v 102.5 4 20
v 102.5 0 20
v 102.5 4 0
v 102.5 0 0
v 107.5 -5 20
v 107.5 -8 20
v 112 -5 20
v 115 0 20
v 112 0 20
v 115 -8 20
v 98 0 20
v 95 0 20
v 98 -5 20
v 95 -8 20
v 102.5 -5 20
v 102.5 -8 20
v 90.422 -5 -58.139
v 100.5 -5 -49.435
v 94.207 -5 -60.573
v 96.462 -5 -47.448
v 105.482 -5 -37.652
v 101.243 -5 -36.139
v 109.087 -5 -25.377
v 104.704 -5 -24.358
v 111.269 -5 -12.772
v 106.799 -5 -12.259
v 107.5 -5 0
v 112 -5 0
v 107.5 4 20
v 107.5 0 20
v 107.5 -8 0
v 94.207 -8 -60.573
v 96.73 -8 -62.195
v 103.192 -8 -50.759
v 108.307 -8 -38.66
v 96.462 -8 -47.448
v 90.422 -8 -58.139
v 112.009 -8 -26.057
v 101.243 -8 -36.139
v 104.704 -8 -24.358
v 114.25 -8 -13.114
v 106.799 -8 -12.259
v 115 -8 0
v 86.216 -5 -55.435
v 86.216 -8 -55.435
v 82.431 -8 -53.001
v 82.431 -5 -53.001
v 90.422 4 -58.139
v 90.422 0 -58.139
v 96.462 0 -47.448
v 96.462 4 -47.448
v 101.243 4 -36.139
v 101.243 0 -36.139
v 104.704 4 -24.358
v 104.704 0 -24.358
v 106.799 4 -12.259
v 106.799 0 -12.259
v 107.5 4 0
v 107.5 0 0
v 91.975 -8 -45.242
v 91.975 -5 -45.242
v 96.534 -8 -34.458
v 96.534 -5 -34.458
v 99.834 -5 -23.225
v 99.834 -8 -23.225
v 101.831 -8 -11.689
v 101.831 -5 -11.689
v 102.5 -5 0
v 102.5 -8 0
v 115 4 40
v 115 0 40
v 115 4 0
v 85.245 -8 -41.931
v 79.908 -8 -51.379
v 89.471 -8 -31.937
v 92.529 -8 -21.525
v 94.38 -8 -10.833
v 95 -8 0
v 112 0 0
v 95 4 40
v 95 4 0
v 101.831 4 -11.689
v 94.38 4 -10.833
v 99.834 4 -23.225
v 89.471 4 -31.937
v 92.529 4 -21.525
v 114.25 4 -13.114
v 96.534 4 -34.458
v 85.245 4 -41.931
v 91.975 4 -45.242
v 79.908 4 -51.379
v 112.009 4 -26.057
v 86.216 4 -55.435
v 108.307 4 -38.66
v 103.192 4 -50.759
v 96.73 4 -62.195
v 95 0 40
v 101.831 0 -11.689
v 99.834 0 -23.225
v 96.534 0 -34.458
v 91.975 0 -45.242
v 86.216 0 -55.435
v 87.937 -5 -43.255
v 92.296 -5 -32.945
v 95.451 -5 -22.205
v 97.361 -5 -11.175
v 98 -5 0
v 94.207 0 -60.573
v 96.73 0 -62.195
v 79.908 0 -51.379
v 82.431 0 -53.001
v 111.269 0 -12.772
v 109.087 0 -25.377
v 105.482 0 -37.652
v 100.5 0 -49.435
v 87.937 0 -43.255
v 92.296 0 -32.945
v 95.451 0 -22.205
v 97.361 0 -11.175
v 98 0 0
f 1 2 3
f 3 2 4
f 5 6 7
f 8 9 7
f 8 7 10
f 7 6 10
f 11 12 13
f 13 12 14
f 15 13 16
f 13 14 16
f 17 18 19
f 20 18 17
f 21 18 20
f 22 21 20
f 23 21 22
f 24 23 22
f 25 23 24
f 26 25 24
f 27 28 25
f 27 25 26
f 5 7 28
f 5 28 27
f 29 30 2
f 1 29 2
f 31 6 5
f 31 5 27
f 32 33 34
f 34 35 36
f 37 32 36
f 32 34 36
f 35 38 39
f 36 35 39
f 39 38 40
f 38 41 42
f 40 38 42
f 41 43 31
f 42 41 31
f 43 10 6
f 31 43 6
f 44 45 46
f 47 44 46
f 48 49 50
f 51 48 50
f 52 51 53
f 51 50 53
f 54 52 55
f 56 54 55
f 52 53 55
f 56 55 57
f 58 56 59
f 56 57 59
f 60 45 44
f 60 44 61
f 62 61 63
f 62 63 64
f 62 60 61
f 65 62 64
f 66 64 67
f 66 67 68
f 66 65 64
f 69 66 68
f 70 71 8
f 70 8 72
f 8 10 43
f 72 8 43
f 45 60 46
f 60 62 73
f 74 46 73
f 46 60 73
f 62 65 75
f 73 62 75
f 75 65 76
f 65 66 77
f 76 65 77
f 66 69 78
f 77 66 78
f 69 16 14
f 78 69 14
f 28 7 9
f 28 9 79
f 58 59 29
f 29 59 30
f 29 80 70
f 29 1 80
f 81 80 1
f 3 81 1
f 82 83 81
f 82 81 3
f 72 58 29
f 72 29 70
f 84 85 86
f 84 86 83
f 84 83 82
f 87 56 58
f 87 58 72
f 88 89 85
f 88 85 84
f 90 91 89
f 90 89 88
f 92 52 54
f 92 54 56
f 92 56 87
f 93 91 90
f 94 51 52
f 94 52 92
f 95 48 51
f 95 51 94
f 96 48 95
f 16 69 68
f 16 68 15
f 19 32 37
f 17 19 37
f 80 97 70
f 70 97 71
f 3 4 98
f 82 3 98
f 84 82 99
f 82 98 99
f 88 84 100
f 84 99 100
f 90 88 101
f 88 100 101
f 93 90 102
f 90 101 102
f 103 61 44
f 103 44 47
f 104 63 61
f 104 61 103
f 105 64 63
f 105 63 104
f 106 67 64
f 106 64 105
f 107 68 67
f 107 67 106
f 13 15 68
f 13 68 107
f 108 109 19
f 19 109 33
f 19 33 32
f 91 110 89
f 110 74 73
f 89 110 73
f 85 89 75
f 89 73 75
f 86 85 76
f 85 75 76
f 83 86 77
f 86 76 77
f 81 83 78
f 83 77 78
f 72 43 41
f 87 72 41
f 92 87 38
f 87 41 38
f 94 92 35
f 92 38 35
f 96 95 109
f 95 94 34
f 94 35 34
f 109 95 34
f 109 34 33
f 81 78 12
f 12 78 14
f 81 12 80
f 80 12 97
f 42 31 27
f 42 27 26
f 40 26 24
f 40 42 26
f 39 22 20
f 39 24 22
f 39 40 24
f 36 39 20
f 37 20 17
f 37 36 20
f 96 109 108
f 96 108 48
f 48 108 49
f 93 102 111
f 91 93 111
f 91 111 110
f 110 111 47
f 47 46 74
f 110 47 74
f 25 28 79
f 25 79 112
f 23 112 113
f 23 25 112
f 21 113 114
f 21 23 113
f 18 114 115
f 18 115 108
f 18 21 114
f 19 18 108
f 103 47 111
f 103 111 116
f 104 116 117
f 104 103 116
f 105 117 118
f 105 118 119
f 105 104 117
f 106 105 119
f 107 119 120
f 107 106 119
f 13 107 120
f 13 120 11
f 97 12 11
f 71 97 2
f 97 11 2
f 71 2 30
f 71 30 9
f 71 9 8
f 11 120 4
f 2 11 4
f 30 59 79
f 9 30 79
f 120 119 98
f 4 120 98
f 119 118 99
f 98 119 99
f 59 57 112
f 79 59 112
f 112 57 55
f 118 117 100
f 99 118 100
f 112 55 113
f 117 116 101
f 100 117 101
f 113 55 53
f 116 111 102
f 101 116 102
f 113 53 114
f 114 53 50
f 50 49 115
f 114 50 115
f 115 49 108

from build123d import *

# Parameters (mm, degrees)
BOSS_EXTRUDE1_DEPTH = 4
BOSS_EXTRUDE2_START = 5
BOSS_EXTRUDE2_DEPTH = 5
BOSS_EXTRUDE3_START = 3
BOSS_EXTRUDE3_DEPTH = 3
CUT_EXTRUDE1_START  = -43
CUT_EXTRUDE1_DEPTH  = 43


with BuildPart() as part:
    # Sketch1 → Boss-Extrude1 (new body)
    with BuildSketch(Plane(origin=(0, 0, 0), x_dir=(1, 0, 0), z_dir=(0, 1, 0))):
        with BuildLine():
            Line((86.216175346, 55.434836598), (79.907674711, 51.378629042))
            ThreePointArc((79.907674711, 51.378629042), (91.148859284, 26.774716641), (95, 0))
            Line((95, 0), (102.5, 0))
            ThreePointArc((102.5, 0), (98.344821859, 28.88851006), (86.216175346, 55.434836598))
        make_face()
        with BuildLine():
            Line((96.730343071, 62.195182525), (90.421842436, 58.138974969))
            ThreePointArc((90.421842436, 58.138974969), (103.142130242, 30.297705673), (107.5, 0))
            Line((107.5, 0), (115, 0))
            ThreePointArc((115, 0), (110.338092817, 32.411499092), (96.730343071, 62.195182525))
        make_face()
        Polygon((102.5, 0), (95, 0), (95, -40), (115, -40), (115, 0), (107.5, 0), (107.5, -20), (102.5, -20), align=None)
    extrude(amount=BOSS_EXTRUDE1_DEPTH)

    # Sketch2 → Boss-Extrude2 (add)
    with BuildSketch(Plane.XZ.offset(BOSS_EXTRUDE2_START)):
        with BuildLine():
            Line((112, 20), (112, 0))
            ThreePointArc((112, 0), (107.459707787, -31.565981725), (94.206942817, -60.572699503))
            Line((94.206942817, -60.572699503), (96.730343071, -62.195182525))
            ThreePointArc((96.730343071, -62.195182525), (110.338092817, -32.411499092), (115, 0))
            Line((115, 0), (115, 20))
            Line((115, 20), (112, 20))
        make_face()
        with BuildLine():
            ThreePointArc((82.431074965, -53.001112065), (94.027244314, -27.620234009), (98, 0))
            Line((98, 0), (98, 20))
            Line((98, 20), (95, 20))
            Line((95, 20), (95, 0))
            ThreePointArc((95, 0), (91.148859284, -26.774716641), (79.907674711, -51.378629042))
            Line((79.907674711, -51.378629042), (82.431074965, -53.001112065))
        make_face()
    extrude(amount=-BOSS_EXTRUDE2_DEPTH)

    # Sketch3 → Boss-Extrude3 (add)
    with BuildSketch(Plane.XZ.offset(5).offset(BOSS_EXTRUDE3_START)):
        with BuildLine():
            Line((98, 20), (112, 20))
            Line((112, 20), (115, 20))
            Line((115, 20), (115, 0))
            ThreePointArc((115, 0), (110.338092817, -32.411499092), (96.730343071, -62.195182525))
            Line((96.730343071, -62.195182525), (94.206942817, -60.572699503))
            Line((94.206942817, -60.572699503), (82.431074965, -53.001112065))
            Line((82.431074965, -53.001112065), (79.907674711, -51.378629042))
            ThreePointArc((79.907674711, -51.378629042), (91.148859284, -26.774716641), (95, 0))
            Line((95, 0), (95, 20))
            Line((95, 20), (98, 20))
        make_face()
    extrude(amount=-BOSS_EXTRUDE3_DEPTH)

    # Sketch4 → Cut-Extrude1 (cut)
    with BuildSketch(Plane(origin=(0, 4, 0), x_dir=(1, 0, 0), z_dir=(0, 1, 0)).offset(CUT_EXTRUDE1_START)):
        with BuildLine():
            Line((90.421842436, 58.138974969), (86.216175346, 55.434836598))
            ThreePointArc((86.216175346, 55.434836598), (98.344821859, 28.88851006), (102.5, 0))
            Line((102.5, 0), (102.5, -20))
            Line((102.5, -20), (107.5, -20))
            Line((107.5, -20), (107.5, 0))
            ThreePointArc((107.5, 0), (103.142130242, 30.297705673), (90.421842436, 58.138974969))
        make_face()
    extrude(amount=CUT_EXTRUDE1_DEPTH, mode=Mode.SUBTRACT)


solid = part.part
